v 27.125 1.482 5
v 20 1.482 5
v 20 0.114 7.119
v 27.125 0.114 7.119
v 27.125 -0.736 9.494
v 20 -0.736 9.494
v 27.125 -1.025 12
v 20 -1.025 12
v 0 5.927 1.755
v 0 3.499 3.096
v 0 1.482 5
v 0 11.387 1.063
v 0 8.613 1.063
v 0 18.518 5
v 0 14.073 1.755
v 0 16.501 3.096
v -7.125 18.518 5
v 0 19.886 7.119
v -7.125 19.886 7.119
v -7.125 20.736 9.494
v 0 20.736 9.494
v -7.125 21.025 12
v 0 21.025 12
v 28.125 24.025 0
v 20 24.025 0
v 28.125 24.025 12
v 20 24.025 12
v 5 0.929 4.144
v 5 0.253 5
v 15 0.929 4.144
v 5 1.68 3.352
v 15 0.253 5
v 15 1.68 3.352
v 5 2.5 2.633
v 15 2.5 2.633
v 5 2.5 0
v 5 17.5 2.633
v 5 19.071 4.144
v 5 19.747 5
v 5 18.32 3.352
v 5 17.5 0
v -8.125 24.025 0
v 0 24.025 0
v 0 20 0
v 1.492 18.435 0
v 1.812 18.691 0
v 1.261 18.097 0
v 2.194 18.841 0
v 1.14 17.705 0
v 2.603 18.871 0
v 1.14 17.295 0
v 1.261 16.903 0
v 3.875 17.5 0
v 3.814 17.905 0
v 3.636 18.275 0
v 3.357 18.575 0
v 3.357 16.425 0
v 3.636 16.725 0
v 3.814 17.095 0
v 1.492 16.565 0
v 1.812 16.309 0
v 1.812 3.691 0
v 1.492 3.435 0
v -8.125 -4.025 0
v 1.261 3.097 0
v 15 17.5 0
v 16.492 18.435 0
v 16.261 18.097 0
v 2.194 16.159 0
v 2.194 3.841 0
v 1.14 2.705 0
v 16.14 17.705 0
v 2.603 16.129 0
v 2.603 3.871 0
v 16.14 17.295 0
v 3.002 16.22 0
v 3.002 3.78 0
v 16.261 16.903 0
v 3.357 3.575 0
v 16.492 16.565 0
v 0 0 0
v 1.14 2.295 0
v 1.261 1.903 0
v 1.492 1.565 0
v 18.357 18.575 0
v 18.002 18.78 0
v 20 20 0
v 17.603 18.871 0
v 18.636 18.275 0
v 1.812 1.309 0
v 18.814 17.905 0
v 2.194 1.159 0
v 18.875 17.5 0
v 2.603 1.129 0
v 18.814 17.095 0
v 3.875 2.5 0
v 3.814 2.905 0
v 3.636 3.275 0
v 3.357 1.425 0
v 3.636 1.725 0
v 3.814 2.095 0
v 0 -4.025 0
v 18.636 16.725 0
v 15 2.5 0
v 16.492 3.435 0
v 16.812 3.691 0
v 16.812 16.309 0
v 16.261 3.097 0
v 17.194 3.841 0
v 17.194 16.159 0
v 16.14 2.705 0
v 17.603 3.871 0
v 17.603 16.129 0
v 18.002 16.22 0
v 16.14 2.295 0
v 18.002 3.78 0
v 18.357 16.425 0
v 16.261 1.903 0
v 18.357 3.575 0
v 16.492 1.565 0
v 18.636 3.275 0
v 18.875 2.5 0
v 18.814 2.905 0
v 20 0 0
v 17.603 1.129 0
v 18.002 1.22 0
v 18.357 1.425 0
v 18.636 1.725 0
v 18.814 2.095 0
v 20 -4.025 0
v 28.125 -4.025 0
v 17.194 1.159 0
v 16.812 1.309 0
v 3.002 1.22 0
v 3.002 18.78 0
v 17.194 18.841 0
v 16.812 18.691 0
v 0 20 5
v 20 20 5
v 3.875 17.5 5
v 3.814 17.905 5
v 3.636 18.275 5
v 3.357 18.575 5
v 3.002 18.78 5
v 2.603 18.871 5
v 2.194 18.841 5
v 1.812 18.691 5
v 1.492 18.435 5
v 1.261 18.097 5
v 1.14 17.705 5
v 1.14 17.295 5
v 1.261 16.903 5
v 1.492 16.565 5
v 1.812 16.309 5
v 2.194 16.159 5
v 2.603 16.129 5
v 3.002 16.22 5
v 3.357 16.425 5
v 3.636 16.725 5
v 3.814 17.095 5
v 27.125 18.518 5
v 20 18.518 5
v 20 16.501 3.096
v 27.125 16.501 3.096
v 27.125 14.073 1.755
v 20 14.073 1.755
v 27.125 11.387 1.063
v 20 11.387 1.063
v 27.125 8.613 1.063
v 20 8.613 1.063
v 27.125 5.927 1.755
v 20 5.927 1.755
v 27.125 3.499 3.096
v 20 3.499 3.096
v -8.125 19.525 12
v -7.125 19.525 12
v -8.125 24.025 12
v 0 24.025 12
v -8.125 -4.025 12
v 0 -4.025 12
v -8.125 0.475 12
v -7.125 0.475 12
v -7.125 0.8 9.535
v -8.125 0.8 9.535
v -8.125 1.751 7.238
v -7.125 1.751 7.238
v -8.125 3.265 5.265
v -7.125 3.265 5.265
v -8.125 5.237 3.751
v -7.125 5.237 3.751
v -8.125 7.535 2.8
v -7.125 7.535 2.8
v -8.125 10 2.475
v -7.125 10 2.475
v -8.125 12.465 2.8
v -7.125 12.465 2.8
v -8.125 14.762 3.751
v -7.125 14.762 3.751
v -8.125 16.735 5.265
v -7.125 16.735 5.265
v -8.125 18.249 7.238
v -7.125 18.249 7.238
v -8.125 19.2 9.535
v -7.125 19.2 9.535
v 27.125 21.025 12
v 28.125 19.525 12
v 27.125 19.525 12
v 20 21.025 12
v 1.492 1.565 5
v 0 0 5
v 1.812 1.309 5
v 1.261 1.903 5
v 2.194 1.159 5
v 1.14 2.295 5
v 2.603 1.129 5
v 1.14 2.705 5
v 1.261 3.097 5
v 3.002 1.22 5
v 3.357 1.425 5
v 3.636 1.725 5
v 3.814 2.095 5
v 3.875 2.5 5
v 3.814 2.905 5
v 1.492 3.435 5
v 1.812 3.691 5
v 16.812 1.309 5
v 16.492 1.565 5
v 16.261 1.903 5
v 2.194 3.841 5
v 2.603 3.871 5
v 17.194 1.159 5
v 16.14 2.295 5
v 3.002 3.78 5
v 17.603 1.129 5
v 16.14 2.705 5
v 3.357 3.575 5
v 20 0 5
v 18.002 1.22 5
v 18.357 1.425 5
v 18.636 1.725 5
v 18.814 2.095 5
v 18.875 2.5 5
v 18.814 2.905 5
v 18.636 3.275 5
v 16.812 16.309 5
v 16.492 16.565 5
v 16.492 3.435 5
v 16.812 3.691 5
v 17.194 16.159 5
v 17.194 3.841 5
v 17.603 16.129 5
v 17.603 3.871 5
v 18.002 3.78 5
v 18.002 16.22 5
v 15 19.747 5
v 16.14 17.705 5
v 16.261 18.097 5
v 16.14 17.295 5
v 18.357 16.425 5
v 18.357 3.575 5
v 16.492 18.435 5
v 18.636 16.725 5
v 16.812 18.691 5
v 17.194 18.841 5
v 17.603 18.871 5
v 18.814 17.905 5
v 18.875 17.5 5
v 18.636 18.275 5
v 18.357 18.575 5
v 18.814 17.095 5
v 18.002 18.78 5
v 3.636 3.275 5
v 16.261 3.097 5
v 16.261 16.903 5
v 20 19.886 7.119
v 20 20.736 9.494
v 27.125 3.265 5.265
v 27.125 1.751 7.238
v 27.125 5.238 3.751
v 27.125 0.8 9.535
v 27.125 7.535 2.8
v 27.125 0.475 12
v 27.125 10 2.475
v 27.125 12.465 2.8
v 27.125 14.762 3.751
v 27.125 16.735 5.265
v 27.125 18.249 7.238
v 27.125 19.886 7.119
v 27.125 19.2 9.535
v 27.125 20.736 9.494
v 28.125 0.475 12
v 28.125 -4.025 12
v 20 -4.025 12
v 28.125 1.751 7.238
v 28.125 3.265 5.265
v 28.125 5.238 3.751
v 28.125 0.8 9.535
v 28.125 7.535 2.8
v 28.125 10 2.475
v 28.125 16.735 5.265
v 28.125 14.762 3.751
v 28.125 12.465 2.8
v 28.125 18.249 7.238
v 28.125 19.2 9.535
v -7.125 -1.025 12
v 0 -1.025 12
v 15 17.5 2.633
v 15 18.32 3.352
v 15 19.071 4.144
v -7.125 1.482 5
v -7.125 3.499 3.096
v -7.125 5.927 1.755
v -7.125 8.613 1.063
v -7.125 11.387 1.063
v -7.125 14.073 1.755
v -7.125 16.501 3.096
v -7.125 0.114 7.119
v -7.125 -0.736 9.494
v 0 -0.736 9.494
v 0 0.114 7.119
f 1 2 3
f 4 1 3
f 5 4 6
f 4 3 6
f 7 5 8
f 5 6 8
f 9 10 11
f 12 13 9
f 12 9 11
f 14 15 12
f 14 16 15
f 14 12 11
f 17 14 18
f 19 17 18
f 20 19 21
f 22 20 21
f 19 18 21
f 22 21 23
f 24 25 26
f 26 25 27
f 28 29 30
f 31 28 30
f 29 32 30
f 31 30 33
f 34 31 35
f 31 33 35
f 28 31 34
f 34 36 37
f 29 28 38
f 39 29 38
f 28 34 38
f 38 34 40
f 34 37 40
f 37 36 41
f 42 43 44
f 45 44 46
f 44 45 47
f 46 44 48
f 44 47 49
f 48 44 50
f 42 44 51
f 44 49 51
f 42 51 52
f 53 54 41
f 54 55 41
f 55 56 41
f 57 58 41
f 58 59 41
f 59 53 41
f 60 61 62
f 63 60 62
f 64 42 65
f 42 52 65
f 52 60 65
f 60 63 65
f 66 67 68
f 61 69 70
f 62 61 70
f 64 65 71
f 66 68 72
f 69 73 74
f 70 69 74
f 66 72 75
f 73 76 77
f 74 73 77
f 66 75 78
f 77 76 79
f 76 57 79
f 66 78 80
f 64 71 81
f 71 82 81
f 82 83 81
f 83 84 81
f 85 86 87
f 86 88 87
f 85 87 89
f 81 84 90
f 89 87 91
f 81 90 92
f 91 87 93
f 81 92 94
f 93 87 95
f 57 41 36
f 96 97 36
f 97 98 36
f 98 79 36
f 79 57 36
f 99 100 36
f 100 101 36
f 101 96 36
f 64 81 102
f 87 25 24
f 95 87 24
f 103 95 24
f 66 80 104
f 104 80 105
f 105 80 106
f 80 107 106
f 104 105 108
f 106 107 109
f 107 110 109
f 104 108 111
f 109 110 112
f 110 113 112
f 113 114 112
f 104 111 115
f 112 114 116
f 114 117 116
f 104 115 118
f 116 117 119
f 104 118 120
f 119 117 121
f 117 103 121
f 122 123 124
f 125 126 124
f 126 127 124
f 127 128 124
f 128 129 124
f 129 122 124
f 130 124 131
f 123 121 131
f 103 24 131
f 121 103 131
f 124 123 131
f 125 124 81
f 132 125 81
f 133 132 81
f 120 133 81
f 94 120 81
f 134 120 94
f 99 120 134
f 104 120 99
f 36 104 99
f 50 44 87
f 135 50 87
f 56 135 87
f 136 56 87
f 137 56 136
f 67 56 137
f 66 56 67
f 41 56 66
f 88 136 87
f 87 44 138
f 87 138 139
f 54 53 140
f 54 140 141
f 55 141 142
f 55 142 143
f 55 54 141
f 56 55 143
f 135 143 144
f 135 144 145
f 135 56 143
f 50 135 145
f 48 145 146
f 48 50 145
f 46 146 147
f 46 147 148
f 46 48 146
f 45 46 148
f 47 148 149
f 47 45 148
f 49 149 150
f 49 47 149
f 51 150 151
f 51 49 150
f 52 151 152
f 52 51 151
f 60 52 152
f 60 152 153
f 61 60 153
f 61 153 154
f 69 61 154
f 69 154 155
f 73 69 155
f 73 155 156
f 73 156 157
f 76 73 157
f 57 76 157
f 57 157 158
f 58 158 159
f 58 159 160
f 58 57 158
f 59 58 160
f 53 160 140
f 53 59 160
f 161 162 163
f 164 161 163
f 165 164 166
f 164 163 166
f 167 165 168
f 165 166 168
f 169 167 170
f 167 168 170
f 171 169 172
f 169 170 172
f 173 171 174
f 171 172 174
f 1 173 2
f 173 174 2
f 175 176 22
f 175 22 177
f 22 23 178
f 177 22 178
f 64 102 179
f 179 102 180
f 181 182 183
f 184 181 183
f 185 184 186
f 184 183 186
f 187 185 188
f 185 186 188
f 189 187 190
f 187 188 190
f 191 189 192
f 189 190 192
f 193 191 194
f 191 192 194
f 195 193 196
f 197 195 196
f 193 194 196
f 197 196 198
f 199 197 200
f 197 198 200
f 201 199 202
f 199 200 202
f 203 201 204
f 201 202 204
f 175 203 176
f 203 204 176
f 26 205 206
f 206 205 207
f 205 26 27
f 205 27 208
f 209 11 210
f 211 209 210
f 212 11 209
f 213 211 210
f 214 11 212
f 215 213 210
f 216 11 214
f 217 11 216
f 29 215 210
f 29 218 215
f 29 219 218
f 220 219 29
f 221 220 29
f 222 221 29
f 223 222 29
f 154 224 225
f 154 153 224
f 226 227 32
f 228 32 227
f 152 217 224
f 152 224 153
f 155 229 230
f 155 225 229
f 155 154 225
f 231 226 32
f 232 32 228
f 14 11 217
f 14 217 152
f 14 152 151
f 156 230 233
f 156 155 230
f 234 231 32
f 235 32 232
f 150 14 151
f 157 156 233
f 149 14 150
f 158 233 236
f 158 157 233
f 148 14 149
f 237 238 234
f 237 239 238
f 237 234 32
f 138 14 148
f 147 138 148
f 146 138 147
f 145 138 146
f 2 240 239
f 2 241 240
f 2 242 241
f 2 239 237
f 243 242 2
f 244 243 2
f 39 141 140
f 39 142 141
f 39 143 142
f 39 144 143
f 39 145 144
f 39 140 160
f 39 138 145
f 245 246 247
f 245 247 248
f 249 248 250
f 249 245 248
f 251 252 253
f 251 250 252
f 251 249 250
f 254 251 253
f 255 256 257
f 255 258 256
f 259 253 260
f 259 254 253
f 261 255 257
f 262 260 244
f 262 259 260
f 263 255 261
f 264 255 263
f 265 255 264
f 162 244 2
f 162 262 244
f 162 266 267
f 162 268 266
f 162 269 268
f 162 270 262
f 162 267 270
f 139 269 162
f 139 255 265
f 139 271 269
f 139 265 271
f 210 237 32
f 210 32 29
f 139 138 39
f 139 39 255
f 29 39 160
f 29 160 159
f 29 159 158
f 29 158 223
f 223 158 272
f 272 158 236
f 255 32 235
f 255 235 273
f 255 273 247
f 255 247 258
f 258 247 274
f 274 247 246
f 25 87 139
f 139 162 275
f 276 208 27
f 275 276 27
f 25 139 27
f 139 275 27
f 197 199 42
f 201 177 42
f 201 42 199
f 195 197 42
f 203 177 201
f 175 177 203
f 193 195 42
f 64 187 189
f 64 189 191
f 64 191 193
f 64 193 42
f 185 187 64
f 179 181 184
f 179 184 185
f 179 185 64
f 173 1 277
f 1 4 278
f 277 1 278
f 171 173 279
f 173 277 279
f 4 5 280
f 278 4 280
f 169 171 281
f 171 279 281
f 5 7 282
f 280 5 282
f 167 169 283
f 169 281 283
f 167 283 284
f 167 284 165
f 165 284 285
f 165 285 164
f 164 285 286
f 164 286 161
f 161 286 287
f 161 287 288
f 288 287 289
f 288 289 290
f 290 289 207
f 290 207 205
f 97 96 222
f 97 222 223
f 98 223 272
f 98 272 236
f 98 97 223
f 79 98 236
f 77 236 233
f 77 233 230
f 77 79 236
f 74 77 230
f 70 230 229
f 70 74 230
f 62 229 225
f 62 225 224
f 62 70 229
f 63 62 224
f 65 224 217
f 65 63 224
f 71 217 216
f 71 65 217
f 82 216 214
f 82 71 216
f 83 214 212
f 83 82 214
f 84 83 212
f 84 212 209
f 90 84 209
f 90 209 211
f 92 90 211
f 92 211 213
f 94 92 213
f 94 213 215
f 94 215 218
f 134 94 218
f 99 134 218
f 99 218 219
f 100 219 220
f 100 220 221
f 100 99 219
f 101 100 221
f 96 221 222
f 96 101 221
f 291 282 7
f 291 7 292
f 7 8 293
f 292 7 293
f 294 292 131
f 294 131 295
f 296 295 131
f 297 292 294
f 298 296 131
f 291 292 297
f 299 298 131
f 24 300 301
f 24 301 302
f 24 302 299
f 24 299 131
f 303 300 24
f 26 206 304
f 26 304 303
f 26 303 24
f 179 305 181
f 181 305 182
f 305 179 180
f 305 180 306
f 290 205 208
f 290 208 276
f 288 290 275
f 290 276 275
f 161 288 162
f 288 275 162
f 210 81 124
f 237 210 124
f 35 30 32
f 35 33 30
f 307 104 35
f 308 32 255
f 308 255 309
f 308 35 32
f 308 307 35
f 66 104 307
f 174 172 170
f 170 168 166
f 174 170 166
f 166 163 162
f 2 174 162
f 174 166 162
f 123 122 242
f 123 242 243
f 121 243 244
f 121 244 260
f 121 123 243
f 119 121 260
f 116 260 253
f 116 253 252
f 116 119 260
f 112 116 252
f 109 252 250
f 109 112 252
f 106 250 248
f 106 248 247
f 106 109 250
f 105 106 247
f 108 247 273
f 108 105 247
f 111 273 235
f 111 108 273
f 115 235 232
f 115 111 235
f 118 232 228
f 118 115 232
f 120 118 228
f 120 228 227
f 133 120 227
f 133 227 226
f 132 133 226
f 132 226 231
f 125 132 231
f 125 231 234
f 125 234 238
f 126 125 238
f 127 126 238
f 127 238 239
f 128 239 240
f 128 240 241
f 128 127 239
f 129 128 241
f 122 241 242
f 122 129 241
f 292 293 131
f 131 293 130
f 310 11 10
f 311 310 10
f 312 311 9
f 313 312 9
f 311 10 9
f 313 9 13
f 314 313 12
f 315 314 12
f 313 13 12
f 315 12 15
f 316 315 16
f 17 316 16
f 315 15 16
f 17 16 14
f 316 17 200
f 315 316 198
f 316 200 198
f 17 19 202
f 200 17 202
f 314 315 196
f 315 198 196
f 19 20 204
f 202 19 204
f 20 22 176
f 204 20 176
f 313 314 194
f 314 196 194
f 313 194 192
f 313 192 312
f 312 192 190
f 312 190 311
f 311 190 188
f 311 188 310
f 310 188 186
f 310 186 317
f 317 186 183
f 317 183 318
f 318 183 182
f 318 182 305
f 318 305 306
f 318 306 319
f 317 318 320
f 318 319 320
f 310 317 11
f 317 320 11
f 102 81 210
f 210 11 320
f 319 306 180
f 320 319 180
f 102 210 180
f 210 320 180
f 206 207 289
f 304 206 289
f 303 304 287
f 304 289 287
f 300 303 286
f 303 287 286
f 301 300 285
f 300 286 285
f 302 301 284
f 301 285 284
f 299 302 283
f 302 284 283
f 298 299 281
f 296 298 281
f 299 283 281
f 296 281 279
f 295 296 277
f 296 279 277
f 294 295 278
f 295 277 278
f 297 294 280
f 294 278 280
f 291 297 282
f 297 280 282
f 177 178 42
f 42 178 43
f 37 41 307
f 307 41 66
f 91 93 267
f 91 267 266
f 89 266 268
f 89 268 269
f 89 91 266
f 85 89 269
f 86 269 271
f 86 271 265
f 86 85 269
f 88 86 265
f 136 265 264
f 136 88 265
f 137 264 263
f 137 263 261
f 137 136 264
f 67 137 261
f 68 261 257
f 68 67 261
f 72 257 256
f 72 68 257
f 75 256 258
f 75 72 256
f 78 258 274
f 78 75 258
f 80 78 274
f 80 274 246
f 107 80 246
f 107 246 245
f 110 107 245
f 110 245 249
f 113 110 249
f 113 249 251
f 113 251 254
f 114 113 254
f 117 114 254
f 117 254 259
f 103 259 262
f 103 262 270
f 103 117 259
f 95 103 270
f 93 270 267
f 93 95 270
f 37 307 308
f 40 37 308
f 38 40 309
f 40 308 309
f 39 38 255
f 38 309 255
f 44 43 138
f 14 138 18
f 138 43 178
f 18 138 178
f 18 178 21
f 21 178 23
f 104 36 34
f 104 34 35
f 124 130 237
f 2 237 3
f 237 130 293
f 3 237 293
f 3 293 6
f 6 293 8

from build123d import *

# Parameters (mm, degrees)
F0_W      = 20
F0_H      = 20
F0_R      = 1.375
F0_W_2    = 10
F0_H_2    = 15
F1_DEPTH  = 5
F3_DEPTH  = 7.125
F6_DEPTH  = 7.125
F8_DEPTH  = 1
F10_DEPTH = 1
F11_R     = 12
F12_DEPTH = 5


with BuildPart() as f1:
    # F0 (on Top) → F1 (new body)
    with BuildSketch(Plane.XY):
        with Locations((10, 10)):
            Rectangle(F0_W, F0_H)
        with Locations((2.5, 2.5)):
            Circle(F0_R, mode=Mode.SUBTRACT)
        with Locations((17.5, 2.5)):
            Circle(F0_R, mode=Mode.SUBTRACT)
        with Locations((2.5, 17.5)):
            Circle(F0_R, mode=Mode.SUBTRACT)
        with Locations((10, 10)):
            Rectangle(F0_W_2, F0_H_2, mode=Mode.SUBTRACT)
        with Locations((17.5, 17.5)):
            Circle(F0_R, mode=Mode.SUBTRACT)
    extrude(amount=F1_DEPTH)

    # F2 (on face) → F3 (join)
    with BuildSketch(Plane(origin=(0, 0, 0), x_dir=(0, -1, 0), z_dir=(-1, 0, 0))):
        with BuildLine():
            ThreePointArc((-18.5176654665, 5), (-20.379255435, 8.2822477738), (-21.025, 12))
            Line((-21.025, 12), (-24.025, 12))
            Line((-24.025, 12), (-24.025, 0))
            Line((-24.025, 0), (-20, 0))
            Line((-20, 0), (-20, 5))
            Line((-20, 5), (-18.5176654665, 5))
        make_face()
        with BuildLine():
            ThreePointArc((-1.4823345335, 5), (-10, 0.975), (-18.5176654665, 5))
            Line((-18.5176654665, 5), (-20, 5))
            Line((-20, 5), (-20, 0))
            Line((-20, 0), (0, 0))
            Line((0, 0), (0, 5))
            Line((0, 5), (-1.4823345335, 5))
        make_face()
        with BuildLine():
            ThreePointArc((1.025, 12), (0.379255435, 8.2822477738), (-1.4823345335, 5))
            Line((-1.4823345335, 5), (0, 5))
            Line((0, 5), (0, 0))
            Line((0, 0), (4.025, 0))
            Line((4.025, 0), (4.025, 12))
            Line((4.025, 12), (1.025, 12))
        make_face()
    extrude(amount=F3_DEPTH)

    # F5 (on face) → F6 (join)
    with BuildSketch(Plane.YZ.offset(20)):
        with BuildLine():
            Line((0, 5), (1.4823345335, 5))
            ThreePointArc((1.4823345335, 5), (-0.379255435, 8.2822477738), (-1.025, 12))
            Line((-1.025, 12), (-4.025, 12))
            Line((-4.025, 12), (-4.025, 0))
            Line((-4.025, 0), (0, 0))
            Line((0, 0), (0, 5))
        make_face()
        with BuildLine():
            ThreePointArc((18.5176654665, 5), (10, 0.975), (1.4823345335, 5))
            Line((1.4823345335, 5), (0, 5))
            Line((0, 5), (0, 0))
            Line((0, 0), (20, 0))
            Line((20, 0), (20, 5))
            Line((20, 5), (18.5176654665, 5))
        make_face()
        with BuildLine():
            ThreePointArc((21.025, 12), (20.379255435, 8.2822477738), (18.5176654665, 5))
            Line((18.5176654665, 5), (20, 5))
            Line((20, 5), (20, 0))
            Line((20, 0), (24.025, 0))
            Line((24.025, 0), (24.025, 12))
            Line((24.025, 12), (21.025, 12))
        make_face()
    extrude(amount=F6_DEPTH)

    # F7 (on face) → F8 (join)
    with BuildSketch(Plane.YZ.offset(27.125)):
        with BuildLine():
            Line((0.475, 12), (-1.025, 12))
            ThreePointArc((-1.025, 12), (10, 0.975), (21.025, 12))
            Line((21.025, 12), (19.525, 12))
            ThreePointArc((19.525, 12), (10, 2.475), (0.475, 12))
        make_face()
        with BuildLine():
            Line((-4.025, 12), (-4.025, 0))
            Line((-4.025, 0), (24.025, 0))
            Line((24.025, 0), (24.025, 12))
            Line((24.025, 12), (21.025, 12))
            ThreePointArc((21.025, 12), (10, 0.975), (-1.025, 12))
            Line((-1.025, 12), (-4.025, 12))
        make_face()
    extrude(amount=F8_DEPTH)

    # F9 (on face) → F10 (join)
    with BuildSketch(Plane(origin=(-7.125, 0, 0), x_dir=(0, -1, 0), z_dir=(-1, 0, 0))):
        with BuildLine():
            Line((-19.525, 12), (-21.025, 12))
            ThreePointArc((-21.025, 12), (-10, 0.975), (1.025, 12))
            Line((1.025, 12), (-0.475, 12))
            ThreePointArc((-0.475, 12), (-10, 2.475), (-19.525, 12))
        make_face()
        with BuildLine():
            Line((-21.025, 12), (-24.025, 12))
            Line((-24.025, 12), (-24.025, 0))
            Line((-24.025, 0), (4.025, 0))
            Line((4.025, 0), (4.025, 12))
            Line((4.025, 12), (1.025, 12))
            ThreePointArc((1.025, 12), (-10, 0.975), (-21.025, 12))
        make_face()
    extrude(amount=F10_DEPTH)

    # F11 (on offset) → F12 (cut, symmetric)
    with BuildSketch(Plane.YZ.offset(10)):
        with Locations((10, 12)):
            Circle(F11_R)
    extrude(amount=F12_DEPTH, both=True, mode=Mode.SUBTRACT)


solid = f1.part
